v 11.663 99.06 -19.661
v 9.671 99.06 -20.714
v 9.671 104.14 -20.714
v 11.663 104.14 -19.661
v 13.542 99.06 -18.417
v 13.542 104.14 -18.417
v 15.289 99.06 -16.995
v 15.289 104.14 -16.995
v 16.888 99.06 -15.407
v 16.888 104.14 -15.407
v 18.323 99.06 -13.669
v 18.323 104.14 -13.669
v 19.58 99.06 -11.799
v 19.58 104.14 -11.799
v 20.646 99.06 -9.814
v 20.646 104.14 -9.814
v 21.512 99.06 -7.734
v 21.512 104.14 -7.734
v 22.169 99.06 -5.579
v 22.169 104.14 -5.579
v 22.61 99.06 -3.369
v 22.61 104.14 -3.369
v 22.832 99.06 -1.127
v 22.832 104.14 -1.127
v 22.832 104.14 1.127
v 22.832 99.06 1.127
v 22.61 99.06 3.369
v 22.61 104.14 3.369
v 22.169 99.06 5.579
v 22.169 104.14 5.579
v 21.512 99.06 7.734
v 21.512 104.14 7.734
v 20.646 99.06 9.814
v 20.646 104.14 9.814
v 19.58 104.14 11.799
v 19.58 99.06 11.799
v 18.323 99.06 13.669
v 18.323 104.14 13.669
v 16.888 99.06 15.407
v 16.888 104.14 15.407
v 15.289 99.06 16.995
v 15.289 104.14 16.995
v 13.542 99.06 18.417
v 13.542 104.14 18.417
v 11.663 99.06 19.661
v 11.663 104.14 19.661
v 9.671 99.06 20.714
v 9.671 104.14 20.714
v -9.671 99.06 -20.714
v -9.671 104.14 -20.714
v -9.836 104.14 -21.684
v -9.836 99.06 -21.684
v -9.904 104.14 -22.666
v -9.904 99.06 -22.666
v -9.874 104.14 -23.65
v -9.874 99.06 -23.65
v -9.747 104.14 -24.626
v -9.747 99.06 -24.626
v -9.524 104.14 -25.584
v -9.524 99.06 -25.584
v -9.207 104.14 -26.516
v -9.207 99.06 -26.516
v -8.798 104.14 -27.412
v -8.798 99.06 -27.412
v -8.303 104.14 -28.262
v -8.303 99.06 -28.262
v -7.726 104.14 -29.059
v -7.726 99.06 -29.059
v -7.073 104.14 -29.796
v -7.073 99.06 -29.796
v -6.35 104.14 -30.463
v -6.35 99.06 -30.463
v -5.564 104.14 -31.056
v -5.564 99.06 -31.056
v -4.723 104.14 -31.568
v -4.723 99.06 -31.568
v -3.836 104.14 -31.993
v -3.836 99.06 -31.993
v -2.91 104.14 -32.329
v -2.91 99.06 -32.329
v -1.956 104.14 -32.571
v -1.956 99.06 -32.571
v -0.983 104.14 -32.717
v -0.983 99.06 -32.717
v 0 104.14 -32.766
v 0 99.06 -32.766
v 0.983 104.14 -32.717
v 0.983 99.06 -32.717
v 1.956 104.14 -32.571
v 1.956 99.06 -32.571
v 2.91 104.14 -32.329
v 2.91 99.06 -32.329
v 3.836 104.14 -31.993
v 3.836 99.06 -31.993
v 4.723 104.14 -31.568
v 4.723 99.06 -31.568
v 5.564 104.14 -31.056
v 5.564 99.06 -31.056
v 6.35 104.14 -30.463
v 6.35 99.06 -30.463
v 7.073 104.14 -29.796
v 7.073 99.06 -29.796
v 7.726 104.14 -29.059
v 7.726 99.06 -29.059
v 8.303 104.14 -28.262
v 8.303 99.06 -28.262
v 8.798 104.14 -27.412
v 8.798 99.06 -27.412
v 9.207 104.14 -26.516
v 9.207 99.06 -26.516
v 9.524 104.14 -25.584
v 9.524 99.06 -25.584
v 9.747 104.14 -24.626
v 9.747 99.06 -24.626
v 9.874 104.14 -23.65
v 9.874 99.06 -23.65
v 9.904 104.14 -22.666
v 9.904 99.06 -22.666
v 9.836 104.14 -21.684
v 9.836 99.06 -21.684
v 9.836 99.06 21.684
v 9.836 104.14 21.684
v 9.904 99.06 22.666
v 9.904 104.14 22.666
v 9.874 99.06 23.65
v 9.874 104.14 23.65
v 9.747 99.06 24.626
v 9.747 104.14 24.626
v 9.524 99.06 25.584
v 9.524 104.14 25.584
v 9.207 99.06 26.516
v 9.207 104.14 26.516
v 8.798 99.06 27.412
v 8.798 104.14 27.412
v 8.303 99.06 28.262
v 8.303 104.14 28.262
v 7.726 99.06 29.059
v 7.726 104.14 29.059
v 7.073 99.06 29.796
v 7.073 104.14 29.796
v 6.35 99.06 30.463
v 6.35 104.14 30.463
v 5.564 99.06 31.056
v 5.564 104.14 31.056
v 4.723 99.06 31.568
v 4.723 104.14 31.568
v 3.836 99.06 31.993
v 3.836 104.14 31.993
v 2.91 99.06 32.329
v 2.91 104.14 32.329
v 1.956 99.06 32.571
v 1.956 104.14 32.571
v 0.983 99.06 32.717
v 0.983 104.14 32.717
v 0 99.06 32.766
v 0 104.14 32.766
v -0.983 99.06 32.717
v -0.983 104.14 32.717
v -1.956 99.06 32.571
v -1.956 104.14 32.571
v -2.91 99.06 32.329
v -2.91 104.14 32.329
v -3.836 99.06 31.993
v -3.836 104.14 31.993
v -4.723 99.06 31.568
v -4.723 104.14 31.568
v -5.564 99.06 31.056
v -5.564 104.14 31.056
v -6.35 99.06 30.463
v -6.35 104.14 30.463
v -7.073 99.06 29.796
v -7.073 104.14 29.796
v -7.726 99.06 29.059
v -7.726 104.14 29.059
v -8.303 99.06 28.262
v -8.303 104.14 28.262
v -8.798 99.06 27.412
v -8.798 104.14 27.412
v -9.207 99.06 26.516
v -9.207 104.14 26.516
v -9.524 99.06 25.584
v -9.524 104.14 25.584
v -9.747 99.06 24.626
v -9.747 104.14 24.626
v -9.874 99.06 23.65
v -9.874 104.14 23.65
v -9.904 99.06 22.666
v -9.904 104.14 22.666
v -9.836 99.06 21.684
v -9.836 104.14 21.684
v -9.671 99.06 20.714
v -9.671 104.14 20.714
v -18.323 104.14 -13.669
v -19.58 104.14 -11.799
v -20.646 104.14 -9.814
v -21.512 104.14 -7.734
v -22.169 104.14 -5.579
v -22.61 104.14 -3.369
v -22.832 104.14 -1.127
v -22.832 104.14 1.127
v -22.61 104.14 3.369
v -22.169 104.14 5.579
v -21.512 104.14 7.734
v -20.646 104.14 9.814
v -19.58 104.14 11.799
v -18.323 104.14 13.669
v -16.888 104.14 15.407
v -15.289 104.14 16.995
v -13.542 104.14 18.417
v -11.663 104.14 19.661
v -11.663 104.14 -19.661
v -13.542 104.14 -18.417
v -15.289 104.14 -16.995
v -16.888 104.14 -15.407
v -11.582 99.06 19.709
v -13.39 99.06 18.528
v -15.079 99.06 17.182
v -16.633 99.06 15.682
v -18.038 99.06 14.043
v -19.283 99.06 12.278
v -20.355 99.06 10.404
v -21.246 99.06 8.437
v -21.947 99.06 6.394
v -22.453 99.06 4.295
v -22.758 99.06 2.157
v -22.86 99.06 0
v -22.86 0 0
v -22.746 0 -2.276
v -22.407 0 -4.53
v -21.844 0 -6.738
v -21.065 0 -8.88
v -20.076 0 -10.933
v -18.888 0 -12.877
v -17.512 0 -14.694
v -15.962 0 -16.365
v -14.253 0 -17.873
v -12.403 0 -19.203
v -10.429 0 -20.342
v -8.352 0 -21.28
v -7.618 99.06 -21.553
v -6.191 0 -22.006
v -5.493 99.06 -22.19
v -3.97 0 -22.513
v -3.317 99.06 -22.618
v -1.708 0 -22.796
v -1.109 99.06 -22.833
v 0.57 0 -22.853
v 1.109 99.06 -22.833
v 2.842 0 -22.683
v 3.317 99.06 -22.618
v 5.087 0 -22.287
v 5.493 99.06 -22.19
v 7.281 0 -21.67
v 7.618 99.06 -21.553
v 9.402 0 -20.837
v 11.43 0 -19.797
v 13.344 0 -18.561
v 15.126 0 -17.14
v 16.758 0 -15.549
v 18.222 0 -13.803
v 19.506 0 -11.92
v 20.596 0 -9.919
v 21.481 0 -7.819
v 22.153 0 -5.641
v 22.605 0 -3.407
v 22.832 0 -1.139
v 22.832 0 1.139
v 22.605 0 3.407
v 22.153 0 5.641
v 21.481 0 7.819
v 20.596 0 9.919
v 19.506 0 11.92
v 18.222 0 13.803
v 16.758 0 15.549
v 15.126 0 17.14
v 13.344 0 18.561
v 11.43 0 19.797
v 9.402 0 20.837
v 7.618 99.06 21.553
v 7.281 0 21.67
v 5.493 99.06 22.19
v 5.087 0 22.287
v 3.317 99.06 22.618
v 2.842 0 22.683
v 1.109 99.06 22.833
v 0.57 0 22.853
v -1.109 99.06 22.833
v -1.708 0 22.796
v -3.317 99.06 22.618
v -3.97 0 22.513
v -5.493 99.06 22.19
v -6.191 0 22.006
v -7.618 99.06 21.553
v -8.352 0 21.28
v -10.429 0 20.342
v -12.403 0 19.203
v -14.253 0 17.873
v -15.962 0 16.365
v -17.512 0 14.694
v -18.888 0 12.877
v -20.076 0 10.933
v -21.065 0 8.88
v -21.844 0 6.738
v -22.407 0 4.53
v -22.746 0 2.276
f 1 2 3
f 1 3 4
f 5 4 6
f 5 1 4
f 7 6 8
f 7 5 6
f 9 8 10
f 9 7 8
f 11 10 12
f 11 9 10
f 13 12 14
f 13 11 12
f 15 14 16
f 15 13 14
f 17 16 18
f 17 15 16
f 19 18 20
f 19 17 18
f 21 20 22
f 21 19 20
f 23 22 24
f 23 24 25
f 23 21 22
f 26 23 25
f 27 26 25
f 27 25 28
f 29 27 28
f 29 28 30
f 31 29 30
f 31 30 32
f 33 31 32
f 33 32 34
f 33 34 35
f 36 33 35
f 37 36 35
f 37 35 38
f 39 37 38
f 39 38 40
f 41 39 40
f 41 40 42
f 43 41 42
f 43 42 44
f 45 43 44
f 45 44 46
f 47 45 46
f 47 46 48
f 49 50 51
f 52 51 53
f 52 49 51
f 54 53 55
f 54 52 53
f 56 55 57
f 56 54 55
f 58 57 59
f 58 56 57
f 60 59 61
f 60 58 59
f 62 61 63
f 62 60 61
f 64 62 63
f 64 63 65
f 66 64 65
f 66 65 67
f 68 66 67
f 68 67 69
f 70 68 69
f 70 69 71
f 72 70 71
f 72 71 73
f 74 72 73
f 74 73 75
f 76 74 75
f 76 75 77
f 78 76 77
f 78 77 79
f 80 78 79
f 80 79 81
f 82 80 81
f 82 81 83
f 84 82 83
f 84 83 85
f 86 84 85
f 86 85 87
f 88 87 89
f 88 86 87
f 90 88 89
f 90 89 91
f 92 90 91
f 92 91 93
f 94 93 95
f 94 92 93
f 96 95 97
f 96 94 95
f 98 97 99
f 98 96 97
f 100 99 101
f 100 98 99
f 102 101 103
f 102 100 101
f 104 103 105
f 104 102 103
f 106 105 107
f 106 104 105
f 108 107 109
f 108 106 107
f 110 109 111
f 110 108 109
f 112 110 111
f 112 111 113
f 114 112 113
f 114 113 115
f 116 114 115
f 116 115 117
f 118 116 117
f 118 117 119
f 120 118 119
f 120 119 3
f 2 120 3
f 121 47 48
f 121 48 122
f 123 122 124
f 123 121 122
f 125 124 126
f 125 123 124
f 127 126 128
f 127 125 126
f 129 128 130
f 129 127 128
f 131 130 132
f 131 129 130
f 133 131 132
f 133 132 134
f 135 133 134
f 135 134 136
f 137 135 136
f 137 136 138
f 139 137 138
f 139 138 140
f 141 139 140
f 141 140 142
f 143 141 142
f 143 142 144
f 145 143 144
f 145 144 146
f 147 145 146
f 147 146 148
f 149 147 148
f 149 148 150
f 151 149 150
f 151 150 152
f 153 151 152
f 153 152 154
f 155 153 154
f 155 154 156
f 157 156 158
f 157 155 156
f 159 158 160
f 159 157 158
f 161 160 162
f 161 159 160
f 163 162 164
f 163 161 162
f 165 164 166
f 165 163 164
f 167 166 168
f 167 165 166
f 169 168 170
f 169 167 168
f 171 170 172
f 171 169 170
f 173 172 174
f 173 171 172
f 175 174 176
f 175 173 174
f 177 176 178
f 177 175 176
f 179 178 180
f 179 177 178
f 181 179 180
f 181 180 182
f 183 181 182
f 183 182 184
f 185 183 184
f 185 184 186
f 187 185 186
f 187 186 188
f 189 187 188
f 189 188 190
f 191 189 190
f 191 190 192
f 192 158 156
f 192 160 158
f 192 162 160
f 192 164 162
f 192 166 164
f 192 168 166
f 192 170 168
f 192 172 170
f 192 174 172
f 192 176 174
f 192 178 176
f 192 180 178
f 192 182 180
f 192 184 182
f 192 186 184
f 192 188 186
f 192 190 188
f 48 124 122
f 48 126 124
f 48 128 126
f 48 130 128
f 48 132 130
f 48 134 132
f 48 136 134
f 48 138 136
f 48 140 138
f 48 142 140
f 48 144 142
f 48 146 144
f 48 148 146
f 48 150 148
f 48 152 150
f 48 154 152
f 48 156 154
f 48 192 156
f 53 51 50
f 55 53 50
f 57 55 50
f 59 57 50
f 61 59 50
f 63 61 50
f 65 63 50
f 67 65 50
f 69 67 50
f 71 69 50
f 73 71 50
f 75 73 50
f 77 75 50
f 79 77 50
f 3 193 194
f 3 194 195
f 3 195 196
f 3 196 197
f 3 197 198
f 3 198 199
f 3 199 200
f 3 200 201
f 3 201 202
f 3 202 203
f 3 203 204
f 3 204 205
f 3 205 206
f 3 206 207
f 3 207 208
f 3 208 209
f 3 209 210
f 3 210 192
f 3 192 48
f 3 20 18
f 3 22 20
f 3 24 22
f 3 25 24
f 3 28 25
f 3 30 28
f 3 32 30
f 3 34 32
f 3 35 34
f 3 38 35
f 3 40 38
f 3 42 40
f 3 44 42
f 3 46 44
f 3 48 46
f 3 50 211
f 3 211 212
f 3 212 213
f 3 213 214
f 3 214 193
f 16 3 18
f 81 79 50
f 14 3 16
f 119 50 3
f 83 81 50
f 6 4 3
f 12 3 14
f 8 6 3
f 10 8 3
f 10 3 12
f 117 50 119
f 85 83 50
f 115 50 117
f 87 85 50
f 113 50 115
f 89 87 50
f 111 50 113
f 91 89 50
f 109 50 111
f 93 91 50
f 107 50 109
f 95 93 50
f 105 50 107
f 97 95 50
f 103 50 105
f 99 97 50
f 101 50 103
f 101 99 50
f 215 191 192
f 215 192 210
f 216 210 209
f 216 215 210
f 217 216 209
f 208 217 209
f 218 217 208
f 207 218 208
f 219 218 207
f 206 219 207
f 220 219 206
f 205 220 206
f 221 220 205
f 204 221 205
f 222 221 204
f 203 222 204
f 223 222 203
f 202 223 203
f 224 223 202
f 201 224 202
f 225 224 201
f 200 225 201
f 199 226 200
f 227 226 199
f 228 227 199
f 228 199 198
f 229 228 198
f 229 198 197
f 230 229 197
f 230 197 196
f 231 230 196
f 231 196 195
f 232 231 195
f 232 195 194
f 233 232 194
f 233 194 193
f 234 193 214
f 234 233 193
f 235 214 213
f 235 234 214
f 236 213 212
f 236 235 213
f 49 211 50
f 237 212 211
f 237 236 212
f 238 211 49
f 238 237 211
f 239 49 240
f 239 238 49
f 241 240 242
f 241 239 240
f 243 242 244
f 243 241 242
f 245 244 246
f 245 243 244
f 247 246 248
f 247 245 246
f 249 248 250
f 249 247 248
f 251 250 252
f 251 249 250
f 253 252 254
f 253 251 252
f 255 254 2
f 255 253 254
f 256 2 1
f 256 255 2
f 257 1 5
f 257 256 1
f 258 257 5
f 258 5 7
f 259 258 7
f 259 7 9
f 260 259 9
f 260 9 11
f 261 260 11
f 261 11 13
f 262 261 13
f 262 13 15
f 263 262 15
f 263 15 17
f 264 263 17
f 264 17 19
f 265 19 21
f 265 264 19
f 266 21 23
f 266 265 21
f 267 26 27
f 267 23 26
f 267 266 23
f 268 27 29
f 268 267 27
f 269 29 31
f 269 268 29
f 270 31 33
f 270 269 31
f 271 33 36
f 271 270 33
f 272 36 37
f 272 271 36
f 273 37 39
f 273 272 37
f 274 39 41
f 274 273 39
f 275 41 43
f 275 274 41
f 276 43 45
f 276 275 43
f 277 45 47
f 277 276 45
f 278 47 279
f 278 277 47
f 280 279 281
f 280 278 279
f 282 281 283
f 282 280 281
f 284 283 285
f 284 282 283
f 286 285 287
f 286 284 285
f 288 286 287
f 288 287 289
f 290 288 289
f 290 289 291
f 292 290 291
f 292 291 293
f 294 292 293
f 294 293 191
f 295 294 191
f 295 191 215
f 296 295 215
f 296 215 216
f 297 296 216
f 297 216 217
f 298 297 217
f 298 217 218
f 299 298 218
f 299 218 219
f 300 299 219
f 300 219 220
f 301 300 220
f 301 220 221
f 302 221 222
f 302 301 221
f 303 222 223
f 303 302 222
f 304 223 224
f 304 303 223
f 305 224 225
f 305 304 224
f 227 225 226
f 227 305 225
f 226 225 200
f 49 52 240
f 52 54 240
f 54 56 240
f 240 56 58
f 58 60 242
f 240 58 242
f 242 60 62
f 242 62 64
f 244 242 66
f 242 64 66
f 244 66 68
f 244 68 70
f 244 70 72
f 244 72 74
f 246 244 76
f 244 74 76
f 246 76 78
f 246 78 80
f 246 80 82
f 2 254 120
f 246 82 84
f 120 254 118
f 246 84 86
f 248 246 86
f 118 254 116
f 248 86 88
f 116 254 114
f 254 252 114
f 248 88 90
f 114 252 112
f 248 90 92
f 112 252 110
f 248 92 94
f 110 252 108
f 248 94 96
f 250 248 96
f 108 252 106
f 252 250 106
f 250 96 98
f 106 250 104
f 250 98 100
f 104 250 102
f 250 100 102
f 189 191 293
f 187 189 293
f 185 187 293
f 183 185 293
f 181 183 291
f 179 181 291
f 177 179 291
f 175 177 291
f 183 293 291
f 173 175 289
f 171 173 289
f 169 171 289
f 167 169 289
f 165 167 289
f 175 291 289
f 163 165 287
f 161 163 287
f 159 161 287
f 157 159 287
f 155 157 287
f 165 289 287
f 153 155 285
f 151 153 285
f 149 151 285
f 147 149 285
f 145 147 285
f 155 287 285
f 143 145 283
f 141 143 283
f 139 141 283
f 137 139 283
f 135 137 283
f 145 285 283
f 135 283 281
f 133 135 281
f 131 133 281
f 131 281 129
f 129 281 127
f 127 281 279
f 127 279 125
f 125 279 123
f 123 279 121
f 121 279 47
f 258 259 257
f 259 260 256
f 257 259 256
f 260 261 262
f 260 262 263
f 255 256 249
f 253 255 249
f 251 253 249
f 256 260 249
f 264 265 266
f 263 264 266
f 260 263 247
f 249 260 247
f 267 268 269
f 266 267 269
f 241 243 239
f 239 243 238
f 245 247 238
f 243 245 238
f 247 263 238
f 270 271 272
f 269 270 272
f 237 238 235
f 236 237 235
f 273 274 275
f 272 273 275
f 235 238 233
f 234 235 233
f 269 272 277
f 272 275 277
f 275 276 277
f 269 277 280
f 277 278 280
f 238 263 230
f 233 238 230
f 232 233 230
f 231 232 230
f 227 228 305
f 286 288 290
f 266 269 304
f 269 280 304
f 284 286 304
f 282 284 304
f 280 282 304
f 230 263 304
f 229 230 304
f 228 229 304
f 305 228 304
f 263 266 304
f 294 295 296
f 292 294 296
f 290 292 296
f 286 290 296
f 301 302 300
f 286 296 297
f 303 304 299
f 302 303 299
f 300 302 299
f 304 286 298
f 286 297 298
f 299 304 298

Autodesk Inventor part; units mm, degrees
ref_plane "XZ Plane" through (0, 0, 0) normal (0, 1, 0) x (-1, 0, 0)
ref_plane "XY Plane" through (0, 0, 0) normal (0, 0, 1) x (1, 0, 0)
sketch "Sketch1" plane through (0, 0, 0) normal (0, 1, 0) x (-1, 0, 0)
  circle A0 centre (0, 0) radius 22.86
  dimension "d0" = 45.72
extrude "Extrusion1" add sketch "Sketch1" along normal blind 99.06
sketch "Sketch2" plane through (0, 99.06, 0) normal (0, 1, 0) x (1, 0, 0)
  circle A0 centre (0, 0) radius 22.86 projected
  circle A1 centre (0, -22.86) radius 9.906
  circle A2 centre (0, 22.86) radius 9.906
  dimension "d3" = 19.812
  dimension "d4" = 19.812
extrude "Extrusion2" add sketch "Sketch2" along normal blind 5.08
ref_plane "Work Plane1" through (22.86, 0, 0) normal (1, 0, 0) x (0, 1, 0)
properties part number "reducedLargeSyrginePlunger"
